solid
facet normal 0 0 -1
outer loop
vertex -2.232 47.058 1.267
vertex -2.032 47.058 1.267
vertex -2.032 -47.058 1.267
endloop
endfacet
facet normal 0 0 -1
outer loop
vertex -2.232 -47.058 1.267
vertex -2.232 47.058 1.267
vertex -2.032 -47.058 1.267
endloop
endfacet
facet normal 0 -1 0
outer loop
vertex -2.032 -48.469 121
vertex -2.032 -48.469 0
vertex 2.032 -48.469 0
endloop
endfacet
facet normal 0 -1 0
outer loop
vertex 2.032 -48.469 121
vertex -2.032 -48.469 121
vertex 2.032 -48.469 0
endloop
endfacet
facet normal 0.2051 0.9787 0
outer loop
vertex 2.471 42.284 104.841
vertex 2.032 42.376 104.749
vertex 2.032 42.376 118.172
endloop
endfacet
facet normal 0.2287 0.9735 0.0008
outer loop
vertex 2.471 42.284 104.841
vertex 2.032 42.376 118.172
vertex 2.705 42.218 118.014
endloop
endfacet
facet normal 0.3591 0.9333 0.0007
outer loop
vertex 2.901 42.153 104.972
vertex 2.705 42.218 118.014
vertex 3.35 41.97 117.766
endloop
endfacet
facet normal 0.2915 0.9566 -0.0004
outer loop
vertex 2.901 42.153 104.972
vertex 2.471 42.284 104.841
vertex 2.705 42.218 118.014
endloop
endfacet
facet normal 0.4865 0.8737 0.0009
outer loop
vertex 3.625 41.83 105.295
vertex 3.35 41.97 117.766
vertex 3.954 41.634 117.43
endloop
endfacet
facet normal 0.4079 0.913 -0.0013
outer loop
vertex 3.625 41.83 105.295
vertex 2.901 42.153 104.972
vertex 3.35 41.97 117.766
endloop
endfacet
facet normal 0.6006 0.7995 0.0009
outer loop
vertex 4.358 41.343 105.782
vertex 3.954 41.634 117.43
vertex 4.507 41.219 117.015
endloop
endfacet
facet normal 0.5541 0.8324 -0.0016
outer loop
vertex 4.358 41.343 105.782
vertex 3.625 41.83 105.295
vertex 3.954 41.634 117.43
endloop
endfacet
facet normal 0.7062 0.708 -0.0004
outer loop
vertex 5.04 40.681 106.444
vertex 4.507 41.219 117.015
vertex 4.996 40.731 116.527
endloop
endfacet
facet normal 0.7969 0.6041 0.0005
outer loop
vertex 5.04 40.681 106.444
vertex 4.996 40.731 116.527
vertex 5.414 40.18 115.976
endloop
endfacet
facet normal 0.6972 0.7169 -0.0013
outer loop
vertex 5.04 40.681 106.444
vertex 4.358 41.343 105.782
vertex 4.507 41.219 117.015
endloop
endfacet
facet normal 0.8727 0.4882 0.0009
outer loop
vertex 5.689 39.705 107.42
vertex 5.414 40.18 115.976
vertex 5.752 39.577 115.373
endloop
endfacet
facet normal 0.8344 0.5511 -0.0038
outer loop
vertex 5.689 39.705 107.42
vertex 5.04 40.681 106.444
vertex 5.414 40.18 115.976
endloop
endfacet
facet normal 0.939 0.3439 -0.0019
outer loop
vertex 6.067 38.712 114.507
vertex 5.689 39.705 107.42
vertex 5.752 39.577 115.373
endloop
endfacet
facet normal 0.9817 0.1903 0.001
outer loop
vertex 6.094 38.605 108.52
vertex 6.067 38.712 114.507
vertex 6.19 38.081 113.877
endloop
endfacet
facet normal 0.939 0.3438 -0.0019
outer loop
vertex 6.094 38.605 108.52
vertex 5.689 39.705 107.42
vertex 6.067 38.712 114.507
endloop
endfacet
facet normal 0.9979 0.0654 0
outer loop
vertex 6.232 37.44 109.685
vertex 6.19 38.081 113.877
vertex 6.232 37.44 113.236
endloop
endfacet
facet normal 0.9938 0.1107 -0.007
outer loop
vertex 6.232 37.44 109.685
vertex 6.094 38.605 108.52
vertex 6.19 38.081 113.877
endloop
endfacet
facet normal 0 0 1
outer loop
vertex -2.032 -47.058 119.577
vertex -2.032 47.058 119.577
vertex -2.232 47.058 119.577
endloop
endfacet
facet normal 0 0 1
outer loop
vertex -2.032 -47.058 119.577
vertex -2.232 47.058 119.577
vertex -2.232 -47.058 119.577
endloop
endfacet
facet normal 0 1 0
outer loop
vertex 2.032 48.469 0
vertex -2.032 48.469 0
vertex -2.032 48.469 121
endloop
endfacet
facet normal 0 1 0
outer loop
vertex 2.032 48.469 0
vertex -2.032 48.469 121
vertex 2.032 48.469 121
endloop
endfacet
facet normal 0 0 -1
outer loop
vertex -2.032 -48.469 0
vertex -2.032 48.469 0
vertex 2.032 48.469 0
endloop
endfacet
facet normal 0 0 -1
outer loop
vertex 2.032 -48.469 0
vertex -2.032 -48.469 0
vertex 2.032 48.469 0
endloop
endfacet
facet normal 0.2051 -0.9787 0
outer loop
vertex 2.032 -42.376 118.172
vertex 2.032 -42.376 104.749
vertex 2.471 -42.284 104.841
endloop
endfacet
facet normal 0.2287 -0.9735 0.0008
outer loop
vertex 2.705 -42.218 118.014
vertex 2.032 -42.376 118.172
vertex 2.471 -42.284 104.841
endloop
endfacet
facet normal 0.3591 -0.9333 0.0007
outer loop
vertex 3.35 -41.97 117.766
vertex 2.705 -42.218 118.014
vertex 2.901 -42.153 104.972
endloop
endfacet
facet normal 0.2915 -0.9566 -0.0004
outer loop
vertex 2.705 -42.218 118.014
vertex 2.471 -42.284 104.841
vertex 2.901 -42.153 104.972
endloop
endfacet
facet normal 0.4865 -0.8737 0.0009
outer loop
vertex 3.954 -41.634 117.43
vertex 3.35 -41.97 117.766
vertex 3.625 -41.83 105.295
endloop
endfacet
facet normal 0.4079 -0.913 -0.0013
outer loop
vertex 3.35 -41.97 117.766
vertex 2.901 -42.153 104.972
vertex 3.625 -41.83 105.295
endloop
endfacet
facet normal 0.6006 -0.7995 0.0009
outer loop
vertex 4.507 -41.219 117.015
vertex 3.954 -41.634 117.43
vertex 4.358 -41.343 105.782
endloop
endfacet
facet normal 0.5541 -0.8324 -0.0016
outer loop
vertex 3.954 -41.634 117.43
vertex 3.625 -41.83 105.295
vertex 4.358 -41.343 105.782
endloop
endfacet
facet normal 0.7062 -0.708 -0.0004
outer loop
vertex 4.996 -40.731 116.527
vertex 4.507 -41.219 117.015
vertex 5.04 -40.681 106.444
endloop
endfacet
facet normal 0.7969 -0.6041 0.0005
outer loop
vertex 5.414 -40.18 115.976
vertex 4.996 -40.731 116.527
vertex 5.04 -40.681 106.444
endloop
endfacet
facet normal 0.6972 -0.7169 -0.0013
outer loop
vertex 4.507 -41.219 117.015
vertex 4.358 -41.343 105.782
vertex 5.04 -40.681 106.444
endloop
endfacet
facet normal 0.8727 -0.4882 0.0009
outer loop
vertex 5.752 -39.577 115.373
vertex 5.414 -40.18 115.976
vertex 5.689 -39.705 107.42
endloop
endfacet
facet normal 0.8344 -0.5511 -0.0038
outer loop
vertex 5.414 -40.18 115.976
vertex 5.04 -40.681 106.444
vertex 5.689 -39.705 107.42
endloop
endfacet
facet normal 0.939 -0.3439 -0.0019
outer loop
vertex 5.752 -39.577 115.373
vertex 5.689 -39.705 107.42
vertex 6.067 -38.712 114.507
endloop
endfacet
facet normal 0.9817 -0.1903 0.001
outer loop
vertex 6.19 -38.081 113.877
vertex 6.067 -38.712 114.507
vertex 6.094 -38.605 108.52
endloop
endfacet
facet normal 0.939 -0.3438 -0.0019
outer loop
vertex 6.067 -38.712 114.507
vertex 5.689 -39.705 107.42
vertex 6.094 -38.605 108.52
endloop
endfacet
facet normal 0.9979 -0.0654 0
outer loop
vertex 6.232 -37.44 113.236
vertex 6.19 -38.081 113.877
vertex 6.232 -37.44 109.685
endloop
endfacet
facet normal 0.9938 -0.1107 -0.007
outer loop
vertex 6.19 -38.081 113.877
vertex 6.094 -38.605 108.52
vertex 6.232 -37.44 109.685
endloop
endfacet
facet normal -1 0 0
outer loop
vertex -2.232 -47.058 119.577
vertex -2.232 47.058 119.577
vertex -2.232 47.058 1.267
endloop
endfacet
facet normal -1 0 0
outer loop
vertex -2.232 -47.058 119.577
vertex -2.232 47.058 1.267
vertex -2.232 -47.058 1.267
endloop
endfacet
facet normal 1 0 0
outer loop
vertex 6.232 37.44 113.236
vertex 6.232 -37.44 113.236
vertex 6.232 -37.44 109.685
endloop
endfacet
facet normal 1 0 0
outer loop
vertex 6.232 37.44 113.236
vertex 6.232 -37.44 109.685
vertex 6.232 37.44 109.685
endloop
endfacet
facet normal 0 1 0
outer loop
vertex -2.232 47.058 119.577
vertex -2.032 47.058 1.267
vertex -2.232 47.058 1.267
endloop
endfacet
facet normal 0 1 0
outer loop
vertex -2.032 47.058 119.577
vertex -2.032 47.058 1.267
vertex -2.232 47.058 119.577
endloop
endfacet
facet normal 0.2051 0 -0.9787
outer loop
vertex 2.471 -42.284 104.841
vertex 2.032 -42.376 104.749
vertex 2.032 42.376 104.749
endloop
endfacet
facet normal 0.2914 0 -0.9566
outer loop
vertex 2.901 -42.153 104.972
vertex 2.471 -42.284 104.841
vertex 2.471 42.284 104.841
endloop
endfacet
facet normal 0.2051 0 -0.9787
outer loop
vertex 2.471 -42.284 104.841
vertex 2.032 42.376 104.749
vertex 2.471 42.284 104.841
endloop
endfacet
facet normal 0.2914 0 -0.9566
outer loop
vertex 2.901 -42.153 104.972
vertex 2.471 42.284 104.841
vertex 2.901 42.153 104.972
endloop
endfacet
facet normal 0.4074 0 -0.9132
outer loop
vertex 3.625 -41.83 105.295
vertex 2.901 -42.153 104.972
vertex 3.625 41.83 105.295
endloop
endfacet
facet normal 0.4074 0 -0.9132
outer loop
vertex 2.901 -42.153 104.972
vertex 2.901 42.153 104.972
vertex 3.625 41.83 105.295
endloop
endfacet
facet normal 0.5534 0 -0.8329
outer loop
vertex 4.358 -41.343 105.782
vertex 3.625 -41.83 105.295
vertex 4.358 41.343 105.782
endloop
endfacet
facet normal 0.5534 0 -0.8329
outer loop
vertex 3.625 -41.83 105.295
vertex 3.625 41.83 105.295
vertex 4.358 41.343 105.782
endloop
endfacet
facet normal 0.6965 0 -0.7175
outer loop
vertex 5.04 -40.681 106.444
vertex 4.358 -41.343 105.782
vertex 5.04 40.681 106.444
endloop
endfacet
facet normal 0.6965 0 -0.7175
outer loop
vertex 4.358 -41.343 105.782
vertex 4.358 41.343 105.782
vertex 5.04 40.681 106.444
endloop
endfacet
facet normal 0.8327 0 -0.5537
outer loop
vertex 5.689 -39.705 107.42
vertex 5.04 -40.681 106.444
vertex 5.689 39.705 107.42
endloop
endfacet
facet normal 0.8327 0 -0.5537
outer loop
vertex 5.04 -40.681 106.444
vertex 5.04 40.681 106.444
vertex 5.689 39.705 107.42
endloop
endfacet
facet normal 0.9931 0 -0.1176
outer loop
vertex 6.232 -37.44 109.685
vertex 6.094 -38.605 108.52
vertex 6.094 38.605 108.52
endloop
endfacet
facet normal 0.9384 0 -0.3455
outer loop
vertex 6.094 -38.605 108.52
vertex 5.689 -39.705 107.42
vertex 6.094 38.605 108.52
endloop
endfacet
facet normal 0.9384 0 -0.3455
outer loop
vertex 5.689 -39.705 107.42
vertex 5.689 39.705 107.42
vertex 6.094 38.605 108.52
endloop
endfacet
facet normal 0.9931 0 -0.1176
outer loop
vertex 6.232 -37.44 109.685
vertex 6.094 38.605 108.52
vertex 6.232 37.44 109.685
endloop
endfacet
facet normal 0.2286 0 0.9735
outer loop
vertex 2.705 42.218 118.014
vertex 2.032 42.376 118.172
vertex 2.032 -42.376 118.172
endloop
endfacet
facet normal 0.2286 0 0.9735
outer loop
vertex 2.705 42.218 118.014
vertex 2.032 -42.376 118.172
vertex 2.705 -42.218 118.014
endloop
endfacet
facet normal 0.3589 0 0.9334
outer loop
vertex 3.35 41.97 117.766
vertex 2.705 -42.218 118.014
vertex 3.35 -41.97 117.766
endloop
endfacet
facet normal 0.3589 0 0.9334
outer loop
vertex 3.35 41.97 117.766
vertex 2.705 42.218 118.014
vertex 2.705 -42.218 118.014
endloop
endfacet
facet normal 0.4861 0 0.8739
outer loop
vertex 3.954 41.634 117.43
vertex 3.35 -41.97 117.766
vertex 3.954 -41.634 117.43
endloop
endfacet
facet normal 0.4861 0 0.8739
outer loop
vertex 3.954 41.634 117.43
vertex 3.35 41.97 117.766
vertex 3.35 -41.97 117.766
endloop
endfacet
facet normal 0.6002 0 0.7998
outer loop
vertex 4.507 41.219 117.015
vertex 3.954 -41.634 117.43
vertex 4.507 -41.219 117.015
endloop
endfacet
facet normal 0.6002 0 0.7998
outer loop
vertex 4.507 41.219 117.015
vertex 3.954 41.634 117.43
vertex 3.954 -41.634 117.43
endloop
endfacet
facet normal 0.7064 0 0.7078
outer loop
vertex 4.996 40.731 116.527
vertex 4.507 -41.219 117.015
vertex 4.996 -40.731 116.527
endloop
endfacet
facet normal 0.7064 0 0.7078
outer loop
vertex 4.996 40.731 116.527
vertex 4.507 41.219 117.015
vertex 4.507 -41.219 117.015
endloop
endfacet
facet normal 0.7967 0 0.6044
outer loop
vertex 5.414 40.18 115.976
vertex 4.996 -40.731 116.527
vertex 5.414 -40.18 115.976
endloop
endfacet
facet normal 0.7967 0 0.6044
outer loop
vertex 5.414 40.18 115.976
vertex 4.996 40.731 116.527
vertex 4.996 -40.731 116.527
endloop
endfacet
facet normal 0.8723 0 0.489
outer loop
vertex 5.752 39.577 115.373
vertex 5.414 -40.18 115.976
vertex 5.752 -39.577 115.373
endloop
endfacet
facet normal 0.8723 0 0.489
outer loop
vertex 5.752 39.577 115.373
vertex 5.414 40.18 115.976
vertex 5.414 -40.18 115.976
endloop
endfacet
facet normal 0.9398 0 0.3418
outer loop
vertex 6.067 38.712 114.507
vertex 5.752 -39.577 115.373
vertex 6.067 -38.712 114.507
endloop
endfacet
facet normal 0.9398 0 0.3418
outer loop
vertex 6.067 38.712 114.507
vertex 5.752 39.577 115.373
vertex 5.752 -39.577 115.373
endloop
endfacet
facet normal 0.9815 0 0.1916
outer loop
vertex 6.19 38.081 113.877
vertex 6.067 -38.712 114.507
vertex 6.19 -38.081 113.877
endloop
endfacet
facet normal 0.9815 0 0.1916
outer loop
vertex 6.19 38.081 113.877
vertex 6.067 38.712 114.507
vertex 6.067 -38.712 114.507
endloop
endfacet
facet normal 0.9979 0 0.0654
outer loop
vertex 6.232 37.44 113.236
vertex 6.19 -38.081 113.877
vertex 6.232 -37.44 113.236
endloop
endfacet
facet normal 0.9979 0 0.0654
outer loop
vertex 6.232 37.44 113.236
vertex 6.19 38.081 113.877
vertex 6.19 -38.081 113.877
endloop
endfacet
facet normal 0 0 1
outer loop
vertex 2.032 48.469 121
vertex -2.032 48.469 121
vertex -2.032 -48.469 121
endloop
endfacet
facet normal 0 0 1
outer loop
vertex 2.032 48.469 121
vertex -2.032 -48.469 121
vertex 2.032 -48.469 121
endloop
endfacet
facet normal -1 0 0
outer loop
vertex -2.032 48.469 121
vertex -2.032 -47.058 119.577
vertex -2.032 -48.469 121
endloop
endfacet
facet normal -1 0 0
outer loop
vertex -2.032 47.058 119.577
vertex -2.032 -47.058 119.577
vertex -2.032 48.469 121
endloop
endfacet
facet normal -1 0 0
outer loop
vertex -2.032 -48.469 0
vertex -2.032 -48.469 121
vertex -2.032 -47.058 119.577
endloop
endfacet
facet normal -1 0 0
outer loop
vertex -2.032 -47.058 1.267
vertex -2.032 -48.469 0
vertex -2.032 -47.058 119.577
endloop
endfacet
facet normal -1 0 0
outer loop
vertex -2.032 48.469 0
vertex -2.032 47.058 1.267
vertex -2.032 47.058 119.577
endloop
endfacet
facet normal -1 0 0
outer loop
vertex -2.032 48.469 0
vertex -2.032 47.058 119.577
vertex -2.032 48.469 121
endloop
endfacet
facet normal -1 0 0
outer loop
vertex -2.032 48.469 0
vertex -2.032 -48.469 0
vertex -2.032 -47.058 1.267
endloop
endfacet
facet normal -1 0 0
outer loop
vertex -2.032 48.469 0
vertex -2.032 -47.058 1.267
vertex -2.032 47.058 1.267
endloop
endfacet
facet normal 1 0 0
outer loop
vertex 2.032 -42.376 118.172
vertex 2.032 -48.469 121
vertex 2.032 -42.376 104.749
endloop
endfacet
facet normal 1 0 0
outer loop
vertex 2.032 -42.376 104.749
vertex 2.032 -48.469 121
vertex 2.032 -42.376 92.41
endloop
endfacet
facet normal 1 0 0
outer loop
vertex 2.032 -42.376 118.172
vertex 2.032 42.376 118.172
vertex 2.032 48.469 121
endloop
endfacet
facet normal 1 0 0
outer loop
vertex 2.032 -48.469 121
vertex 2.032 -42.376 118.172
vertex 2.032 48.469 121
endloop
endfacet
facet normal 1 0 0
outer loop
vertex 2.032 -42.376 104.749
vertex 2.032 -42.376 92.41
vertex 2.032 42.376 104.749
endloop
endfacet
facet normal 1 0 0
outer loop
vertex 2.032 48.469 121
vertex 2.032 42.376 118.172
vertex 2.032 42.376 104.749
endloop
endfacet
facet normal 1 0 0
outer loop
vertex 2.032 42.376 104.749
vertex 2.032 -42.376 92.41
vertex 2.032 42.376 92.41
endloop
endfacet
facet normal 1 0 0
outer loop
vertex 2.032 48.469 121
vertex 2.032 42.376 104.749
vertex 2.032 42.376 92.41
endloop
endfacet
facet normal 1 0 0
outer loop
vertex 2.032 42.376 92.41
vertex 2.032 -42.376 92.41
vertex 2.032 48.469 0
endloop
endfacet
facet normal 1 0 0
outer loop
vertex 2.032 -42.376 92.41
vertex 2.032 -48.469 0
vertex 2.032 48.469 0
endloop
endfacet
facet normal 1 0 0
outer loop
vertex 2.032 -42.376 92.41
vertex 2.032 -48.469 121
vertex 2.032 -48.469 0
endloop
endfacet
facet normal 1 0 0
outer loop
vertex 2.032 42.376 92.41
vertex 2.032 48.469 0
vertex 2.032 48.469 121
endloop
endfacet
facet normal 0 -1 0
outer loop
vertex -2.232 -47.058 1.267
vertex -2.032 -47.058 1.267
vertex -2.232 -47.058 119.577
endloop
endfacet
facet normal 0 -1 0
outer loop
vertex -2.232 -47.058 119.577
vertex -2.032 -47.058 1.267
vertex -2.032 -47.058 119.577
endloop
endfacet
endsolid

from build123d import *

# Parameters (mm, degrees)
F0_W        = 4.0632686578
F0_H        = 96.9379618764
F1_DEPTH    = 121
F2_W        = 94.1168889403
F2_H        = 118.3094680309
F3_DEPTH    = 0.2
F4_W        = 84.7520232201
F4_H        = 13.4229809046
F5_DEPTH    = 4.2
F6_T1_DEPTH = 109.4299485786
F6_T3_DEPTH = 38.1009062631


# Not quite as in the source:
# - a fillet or chamfer that OpenCascade refuses, or shapes differently, is made with other operations: its cross-section is extruded or revolved along the edge and cut away or added


with BuildPart() as f1:
    # F0 (on Top) → F1 (new body)
    with BuildSketch(Plane.XY):
        Rectangle(F0_W, F0_H)
    extrude(amount=F1_DEPTH)

    # F2 (on face) → F3 (join)
    with BuildSketch(Plane(origin=(-2.0316343289, 0, 0), x_dir=(0, -1, 0), z_dir=(-1, 0, 0))):
        with Locations((0, 60.4219585657)):
            Rectangle(F2_W, F2_H)
    extrude(amount=F3_DEPTH)

    # F4 (on face) → F5 (join)
    with BuildSketch(Plane.YZ.offset(2.0316343289)):
        with Locations((0, 111.4604696631)):
            Rectangle(F4_W, F4_H)
    extrude(amount=F5_DEPTH)

    # F6: fillet of radius 5 on 4 edges, made by hand

    # F6_s2 → F6_t1 (cut)
    with BuildSketch(Plane.XZ.offset(-54.7149742893)):
        with BuildLine():
            ThreePointArc((2.0316343289, 118.1719601154), (5.0395208818, 116.4767453929), (6.2316343289, 113.2363750437))
            Line((6.2316343289, 113.2363750437), (6.2316343289, 118.1719601154))
            Line((6.2316343289, 118.1719601154), (2.0316343289, 118.1719601154))
        make_face()
        with BuildLine():
            ThreePointArc((2.0316343289, 104.7489792109), (5.0395208818, 106.4441939334), (6.2316343289, 109.6845642826))
            Line((6.2316343289, 109.6845642826), (6.2316343289, 104.7489792109))
            Line((6.2316343289, 104.7489792109), (2.0316343289, 104.7489792109))
        make_face()
    extrude(amount=F6_T1_DEPTH, mode=Mode.SUBTRACT)

    # F6_s4 → F6_t3 (cut)
    with BuildSketch(Plane.XY.offset(92.4100165316)):
        with BuildLine():
            ThreePointArc((2.0316343289, -42.37601161), (5.0395208818, -40.6807968875), (6.2316343289, -37.4404265383))
            Line((6.2316343289, -37.4404265383), (6.2316343289, -42.37601161))
            Line((6.2316343289, -42.37601161), (2.0316343289, -42.37601161))
        make_face()
        with BuildLine():
            ThreePointArc((2.0316343289, 42.37601161), (5.0395208818, 40.6807968875), (6.2316343289, 37.4404265383))
            Line((6.2316343289, 37.4404265383), (6.2316343289, 42.37601161))
            Line((6.2316343289, 42.37601161), (2.0316343289, 42.37601161))
        make_face()
    extrude(amount=F6_T3_DEPTH, mode=Mode.SUBTRACT)


solid = f1.part
